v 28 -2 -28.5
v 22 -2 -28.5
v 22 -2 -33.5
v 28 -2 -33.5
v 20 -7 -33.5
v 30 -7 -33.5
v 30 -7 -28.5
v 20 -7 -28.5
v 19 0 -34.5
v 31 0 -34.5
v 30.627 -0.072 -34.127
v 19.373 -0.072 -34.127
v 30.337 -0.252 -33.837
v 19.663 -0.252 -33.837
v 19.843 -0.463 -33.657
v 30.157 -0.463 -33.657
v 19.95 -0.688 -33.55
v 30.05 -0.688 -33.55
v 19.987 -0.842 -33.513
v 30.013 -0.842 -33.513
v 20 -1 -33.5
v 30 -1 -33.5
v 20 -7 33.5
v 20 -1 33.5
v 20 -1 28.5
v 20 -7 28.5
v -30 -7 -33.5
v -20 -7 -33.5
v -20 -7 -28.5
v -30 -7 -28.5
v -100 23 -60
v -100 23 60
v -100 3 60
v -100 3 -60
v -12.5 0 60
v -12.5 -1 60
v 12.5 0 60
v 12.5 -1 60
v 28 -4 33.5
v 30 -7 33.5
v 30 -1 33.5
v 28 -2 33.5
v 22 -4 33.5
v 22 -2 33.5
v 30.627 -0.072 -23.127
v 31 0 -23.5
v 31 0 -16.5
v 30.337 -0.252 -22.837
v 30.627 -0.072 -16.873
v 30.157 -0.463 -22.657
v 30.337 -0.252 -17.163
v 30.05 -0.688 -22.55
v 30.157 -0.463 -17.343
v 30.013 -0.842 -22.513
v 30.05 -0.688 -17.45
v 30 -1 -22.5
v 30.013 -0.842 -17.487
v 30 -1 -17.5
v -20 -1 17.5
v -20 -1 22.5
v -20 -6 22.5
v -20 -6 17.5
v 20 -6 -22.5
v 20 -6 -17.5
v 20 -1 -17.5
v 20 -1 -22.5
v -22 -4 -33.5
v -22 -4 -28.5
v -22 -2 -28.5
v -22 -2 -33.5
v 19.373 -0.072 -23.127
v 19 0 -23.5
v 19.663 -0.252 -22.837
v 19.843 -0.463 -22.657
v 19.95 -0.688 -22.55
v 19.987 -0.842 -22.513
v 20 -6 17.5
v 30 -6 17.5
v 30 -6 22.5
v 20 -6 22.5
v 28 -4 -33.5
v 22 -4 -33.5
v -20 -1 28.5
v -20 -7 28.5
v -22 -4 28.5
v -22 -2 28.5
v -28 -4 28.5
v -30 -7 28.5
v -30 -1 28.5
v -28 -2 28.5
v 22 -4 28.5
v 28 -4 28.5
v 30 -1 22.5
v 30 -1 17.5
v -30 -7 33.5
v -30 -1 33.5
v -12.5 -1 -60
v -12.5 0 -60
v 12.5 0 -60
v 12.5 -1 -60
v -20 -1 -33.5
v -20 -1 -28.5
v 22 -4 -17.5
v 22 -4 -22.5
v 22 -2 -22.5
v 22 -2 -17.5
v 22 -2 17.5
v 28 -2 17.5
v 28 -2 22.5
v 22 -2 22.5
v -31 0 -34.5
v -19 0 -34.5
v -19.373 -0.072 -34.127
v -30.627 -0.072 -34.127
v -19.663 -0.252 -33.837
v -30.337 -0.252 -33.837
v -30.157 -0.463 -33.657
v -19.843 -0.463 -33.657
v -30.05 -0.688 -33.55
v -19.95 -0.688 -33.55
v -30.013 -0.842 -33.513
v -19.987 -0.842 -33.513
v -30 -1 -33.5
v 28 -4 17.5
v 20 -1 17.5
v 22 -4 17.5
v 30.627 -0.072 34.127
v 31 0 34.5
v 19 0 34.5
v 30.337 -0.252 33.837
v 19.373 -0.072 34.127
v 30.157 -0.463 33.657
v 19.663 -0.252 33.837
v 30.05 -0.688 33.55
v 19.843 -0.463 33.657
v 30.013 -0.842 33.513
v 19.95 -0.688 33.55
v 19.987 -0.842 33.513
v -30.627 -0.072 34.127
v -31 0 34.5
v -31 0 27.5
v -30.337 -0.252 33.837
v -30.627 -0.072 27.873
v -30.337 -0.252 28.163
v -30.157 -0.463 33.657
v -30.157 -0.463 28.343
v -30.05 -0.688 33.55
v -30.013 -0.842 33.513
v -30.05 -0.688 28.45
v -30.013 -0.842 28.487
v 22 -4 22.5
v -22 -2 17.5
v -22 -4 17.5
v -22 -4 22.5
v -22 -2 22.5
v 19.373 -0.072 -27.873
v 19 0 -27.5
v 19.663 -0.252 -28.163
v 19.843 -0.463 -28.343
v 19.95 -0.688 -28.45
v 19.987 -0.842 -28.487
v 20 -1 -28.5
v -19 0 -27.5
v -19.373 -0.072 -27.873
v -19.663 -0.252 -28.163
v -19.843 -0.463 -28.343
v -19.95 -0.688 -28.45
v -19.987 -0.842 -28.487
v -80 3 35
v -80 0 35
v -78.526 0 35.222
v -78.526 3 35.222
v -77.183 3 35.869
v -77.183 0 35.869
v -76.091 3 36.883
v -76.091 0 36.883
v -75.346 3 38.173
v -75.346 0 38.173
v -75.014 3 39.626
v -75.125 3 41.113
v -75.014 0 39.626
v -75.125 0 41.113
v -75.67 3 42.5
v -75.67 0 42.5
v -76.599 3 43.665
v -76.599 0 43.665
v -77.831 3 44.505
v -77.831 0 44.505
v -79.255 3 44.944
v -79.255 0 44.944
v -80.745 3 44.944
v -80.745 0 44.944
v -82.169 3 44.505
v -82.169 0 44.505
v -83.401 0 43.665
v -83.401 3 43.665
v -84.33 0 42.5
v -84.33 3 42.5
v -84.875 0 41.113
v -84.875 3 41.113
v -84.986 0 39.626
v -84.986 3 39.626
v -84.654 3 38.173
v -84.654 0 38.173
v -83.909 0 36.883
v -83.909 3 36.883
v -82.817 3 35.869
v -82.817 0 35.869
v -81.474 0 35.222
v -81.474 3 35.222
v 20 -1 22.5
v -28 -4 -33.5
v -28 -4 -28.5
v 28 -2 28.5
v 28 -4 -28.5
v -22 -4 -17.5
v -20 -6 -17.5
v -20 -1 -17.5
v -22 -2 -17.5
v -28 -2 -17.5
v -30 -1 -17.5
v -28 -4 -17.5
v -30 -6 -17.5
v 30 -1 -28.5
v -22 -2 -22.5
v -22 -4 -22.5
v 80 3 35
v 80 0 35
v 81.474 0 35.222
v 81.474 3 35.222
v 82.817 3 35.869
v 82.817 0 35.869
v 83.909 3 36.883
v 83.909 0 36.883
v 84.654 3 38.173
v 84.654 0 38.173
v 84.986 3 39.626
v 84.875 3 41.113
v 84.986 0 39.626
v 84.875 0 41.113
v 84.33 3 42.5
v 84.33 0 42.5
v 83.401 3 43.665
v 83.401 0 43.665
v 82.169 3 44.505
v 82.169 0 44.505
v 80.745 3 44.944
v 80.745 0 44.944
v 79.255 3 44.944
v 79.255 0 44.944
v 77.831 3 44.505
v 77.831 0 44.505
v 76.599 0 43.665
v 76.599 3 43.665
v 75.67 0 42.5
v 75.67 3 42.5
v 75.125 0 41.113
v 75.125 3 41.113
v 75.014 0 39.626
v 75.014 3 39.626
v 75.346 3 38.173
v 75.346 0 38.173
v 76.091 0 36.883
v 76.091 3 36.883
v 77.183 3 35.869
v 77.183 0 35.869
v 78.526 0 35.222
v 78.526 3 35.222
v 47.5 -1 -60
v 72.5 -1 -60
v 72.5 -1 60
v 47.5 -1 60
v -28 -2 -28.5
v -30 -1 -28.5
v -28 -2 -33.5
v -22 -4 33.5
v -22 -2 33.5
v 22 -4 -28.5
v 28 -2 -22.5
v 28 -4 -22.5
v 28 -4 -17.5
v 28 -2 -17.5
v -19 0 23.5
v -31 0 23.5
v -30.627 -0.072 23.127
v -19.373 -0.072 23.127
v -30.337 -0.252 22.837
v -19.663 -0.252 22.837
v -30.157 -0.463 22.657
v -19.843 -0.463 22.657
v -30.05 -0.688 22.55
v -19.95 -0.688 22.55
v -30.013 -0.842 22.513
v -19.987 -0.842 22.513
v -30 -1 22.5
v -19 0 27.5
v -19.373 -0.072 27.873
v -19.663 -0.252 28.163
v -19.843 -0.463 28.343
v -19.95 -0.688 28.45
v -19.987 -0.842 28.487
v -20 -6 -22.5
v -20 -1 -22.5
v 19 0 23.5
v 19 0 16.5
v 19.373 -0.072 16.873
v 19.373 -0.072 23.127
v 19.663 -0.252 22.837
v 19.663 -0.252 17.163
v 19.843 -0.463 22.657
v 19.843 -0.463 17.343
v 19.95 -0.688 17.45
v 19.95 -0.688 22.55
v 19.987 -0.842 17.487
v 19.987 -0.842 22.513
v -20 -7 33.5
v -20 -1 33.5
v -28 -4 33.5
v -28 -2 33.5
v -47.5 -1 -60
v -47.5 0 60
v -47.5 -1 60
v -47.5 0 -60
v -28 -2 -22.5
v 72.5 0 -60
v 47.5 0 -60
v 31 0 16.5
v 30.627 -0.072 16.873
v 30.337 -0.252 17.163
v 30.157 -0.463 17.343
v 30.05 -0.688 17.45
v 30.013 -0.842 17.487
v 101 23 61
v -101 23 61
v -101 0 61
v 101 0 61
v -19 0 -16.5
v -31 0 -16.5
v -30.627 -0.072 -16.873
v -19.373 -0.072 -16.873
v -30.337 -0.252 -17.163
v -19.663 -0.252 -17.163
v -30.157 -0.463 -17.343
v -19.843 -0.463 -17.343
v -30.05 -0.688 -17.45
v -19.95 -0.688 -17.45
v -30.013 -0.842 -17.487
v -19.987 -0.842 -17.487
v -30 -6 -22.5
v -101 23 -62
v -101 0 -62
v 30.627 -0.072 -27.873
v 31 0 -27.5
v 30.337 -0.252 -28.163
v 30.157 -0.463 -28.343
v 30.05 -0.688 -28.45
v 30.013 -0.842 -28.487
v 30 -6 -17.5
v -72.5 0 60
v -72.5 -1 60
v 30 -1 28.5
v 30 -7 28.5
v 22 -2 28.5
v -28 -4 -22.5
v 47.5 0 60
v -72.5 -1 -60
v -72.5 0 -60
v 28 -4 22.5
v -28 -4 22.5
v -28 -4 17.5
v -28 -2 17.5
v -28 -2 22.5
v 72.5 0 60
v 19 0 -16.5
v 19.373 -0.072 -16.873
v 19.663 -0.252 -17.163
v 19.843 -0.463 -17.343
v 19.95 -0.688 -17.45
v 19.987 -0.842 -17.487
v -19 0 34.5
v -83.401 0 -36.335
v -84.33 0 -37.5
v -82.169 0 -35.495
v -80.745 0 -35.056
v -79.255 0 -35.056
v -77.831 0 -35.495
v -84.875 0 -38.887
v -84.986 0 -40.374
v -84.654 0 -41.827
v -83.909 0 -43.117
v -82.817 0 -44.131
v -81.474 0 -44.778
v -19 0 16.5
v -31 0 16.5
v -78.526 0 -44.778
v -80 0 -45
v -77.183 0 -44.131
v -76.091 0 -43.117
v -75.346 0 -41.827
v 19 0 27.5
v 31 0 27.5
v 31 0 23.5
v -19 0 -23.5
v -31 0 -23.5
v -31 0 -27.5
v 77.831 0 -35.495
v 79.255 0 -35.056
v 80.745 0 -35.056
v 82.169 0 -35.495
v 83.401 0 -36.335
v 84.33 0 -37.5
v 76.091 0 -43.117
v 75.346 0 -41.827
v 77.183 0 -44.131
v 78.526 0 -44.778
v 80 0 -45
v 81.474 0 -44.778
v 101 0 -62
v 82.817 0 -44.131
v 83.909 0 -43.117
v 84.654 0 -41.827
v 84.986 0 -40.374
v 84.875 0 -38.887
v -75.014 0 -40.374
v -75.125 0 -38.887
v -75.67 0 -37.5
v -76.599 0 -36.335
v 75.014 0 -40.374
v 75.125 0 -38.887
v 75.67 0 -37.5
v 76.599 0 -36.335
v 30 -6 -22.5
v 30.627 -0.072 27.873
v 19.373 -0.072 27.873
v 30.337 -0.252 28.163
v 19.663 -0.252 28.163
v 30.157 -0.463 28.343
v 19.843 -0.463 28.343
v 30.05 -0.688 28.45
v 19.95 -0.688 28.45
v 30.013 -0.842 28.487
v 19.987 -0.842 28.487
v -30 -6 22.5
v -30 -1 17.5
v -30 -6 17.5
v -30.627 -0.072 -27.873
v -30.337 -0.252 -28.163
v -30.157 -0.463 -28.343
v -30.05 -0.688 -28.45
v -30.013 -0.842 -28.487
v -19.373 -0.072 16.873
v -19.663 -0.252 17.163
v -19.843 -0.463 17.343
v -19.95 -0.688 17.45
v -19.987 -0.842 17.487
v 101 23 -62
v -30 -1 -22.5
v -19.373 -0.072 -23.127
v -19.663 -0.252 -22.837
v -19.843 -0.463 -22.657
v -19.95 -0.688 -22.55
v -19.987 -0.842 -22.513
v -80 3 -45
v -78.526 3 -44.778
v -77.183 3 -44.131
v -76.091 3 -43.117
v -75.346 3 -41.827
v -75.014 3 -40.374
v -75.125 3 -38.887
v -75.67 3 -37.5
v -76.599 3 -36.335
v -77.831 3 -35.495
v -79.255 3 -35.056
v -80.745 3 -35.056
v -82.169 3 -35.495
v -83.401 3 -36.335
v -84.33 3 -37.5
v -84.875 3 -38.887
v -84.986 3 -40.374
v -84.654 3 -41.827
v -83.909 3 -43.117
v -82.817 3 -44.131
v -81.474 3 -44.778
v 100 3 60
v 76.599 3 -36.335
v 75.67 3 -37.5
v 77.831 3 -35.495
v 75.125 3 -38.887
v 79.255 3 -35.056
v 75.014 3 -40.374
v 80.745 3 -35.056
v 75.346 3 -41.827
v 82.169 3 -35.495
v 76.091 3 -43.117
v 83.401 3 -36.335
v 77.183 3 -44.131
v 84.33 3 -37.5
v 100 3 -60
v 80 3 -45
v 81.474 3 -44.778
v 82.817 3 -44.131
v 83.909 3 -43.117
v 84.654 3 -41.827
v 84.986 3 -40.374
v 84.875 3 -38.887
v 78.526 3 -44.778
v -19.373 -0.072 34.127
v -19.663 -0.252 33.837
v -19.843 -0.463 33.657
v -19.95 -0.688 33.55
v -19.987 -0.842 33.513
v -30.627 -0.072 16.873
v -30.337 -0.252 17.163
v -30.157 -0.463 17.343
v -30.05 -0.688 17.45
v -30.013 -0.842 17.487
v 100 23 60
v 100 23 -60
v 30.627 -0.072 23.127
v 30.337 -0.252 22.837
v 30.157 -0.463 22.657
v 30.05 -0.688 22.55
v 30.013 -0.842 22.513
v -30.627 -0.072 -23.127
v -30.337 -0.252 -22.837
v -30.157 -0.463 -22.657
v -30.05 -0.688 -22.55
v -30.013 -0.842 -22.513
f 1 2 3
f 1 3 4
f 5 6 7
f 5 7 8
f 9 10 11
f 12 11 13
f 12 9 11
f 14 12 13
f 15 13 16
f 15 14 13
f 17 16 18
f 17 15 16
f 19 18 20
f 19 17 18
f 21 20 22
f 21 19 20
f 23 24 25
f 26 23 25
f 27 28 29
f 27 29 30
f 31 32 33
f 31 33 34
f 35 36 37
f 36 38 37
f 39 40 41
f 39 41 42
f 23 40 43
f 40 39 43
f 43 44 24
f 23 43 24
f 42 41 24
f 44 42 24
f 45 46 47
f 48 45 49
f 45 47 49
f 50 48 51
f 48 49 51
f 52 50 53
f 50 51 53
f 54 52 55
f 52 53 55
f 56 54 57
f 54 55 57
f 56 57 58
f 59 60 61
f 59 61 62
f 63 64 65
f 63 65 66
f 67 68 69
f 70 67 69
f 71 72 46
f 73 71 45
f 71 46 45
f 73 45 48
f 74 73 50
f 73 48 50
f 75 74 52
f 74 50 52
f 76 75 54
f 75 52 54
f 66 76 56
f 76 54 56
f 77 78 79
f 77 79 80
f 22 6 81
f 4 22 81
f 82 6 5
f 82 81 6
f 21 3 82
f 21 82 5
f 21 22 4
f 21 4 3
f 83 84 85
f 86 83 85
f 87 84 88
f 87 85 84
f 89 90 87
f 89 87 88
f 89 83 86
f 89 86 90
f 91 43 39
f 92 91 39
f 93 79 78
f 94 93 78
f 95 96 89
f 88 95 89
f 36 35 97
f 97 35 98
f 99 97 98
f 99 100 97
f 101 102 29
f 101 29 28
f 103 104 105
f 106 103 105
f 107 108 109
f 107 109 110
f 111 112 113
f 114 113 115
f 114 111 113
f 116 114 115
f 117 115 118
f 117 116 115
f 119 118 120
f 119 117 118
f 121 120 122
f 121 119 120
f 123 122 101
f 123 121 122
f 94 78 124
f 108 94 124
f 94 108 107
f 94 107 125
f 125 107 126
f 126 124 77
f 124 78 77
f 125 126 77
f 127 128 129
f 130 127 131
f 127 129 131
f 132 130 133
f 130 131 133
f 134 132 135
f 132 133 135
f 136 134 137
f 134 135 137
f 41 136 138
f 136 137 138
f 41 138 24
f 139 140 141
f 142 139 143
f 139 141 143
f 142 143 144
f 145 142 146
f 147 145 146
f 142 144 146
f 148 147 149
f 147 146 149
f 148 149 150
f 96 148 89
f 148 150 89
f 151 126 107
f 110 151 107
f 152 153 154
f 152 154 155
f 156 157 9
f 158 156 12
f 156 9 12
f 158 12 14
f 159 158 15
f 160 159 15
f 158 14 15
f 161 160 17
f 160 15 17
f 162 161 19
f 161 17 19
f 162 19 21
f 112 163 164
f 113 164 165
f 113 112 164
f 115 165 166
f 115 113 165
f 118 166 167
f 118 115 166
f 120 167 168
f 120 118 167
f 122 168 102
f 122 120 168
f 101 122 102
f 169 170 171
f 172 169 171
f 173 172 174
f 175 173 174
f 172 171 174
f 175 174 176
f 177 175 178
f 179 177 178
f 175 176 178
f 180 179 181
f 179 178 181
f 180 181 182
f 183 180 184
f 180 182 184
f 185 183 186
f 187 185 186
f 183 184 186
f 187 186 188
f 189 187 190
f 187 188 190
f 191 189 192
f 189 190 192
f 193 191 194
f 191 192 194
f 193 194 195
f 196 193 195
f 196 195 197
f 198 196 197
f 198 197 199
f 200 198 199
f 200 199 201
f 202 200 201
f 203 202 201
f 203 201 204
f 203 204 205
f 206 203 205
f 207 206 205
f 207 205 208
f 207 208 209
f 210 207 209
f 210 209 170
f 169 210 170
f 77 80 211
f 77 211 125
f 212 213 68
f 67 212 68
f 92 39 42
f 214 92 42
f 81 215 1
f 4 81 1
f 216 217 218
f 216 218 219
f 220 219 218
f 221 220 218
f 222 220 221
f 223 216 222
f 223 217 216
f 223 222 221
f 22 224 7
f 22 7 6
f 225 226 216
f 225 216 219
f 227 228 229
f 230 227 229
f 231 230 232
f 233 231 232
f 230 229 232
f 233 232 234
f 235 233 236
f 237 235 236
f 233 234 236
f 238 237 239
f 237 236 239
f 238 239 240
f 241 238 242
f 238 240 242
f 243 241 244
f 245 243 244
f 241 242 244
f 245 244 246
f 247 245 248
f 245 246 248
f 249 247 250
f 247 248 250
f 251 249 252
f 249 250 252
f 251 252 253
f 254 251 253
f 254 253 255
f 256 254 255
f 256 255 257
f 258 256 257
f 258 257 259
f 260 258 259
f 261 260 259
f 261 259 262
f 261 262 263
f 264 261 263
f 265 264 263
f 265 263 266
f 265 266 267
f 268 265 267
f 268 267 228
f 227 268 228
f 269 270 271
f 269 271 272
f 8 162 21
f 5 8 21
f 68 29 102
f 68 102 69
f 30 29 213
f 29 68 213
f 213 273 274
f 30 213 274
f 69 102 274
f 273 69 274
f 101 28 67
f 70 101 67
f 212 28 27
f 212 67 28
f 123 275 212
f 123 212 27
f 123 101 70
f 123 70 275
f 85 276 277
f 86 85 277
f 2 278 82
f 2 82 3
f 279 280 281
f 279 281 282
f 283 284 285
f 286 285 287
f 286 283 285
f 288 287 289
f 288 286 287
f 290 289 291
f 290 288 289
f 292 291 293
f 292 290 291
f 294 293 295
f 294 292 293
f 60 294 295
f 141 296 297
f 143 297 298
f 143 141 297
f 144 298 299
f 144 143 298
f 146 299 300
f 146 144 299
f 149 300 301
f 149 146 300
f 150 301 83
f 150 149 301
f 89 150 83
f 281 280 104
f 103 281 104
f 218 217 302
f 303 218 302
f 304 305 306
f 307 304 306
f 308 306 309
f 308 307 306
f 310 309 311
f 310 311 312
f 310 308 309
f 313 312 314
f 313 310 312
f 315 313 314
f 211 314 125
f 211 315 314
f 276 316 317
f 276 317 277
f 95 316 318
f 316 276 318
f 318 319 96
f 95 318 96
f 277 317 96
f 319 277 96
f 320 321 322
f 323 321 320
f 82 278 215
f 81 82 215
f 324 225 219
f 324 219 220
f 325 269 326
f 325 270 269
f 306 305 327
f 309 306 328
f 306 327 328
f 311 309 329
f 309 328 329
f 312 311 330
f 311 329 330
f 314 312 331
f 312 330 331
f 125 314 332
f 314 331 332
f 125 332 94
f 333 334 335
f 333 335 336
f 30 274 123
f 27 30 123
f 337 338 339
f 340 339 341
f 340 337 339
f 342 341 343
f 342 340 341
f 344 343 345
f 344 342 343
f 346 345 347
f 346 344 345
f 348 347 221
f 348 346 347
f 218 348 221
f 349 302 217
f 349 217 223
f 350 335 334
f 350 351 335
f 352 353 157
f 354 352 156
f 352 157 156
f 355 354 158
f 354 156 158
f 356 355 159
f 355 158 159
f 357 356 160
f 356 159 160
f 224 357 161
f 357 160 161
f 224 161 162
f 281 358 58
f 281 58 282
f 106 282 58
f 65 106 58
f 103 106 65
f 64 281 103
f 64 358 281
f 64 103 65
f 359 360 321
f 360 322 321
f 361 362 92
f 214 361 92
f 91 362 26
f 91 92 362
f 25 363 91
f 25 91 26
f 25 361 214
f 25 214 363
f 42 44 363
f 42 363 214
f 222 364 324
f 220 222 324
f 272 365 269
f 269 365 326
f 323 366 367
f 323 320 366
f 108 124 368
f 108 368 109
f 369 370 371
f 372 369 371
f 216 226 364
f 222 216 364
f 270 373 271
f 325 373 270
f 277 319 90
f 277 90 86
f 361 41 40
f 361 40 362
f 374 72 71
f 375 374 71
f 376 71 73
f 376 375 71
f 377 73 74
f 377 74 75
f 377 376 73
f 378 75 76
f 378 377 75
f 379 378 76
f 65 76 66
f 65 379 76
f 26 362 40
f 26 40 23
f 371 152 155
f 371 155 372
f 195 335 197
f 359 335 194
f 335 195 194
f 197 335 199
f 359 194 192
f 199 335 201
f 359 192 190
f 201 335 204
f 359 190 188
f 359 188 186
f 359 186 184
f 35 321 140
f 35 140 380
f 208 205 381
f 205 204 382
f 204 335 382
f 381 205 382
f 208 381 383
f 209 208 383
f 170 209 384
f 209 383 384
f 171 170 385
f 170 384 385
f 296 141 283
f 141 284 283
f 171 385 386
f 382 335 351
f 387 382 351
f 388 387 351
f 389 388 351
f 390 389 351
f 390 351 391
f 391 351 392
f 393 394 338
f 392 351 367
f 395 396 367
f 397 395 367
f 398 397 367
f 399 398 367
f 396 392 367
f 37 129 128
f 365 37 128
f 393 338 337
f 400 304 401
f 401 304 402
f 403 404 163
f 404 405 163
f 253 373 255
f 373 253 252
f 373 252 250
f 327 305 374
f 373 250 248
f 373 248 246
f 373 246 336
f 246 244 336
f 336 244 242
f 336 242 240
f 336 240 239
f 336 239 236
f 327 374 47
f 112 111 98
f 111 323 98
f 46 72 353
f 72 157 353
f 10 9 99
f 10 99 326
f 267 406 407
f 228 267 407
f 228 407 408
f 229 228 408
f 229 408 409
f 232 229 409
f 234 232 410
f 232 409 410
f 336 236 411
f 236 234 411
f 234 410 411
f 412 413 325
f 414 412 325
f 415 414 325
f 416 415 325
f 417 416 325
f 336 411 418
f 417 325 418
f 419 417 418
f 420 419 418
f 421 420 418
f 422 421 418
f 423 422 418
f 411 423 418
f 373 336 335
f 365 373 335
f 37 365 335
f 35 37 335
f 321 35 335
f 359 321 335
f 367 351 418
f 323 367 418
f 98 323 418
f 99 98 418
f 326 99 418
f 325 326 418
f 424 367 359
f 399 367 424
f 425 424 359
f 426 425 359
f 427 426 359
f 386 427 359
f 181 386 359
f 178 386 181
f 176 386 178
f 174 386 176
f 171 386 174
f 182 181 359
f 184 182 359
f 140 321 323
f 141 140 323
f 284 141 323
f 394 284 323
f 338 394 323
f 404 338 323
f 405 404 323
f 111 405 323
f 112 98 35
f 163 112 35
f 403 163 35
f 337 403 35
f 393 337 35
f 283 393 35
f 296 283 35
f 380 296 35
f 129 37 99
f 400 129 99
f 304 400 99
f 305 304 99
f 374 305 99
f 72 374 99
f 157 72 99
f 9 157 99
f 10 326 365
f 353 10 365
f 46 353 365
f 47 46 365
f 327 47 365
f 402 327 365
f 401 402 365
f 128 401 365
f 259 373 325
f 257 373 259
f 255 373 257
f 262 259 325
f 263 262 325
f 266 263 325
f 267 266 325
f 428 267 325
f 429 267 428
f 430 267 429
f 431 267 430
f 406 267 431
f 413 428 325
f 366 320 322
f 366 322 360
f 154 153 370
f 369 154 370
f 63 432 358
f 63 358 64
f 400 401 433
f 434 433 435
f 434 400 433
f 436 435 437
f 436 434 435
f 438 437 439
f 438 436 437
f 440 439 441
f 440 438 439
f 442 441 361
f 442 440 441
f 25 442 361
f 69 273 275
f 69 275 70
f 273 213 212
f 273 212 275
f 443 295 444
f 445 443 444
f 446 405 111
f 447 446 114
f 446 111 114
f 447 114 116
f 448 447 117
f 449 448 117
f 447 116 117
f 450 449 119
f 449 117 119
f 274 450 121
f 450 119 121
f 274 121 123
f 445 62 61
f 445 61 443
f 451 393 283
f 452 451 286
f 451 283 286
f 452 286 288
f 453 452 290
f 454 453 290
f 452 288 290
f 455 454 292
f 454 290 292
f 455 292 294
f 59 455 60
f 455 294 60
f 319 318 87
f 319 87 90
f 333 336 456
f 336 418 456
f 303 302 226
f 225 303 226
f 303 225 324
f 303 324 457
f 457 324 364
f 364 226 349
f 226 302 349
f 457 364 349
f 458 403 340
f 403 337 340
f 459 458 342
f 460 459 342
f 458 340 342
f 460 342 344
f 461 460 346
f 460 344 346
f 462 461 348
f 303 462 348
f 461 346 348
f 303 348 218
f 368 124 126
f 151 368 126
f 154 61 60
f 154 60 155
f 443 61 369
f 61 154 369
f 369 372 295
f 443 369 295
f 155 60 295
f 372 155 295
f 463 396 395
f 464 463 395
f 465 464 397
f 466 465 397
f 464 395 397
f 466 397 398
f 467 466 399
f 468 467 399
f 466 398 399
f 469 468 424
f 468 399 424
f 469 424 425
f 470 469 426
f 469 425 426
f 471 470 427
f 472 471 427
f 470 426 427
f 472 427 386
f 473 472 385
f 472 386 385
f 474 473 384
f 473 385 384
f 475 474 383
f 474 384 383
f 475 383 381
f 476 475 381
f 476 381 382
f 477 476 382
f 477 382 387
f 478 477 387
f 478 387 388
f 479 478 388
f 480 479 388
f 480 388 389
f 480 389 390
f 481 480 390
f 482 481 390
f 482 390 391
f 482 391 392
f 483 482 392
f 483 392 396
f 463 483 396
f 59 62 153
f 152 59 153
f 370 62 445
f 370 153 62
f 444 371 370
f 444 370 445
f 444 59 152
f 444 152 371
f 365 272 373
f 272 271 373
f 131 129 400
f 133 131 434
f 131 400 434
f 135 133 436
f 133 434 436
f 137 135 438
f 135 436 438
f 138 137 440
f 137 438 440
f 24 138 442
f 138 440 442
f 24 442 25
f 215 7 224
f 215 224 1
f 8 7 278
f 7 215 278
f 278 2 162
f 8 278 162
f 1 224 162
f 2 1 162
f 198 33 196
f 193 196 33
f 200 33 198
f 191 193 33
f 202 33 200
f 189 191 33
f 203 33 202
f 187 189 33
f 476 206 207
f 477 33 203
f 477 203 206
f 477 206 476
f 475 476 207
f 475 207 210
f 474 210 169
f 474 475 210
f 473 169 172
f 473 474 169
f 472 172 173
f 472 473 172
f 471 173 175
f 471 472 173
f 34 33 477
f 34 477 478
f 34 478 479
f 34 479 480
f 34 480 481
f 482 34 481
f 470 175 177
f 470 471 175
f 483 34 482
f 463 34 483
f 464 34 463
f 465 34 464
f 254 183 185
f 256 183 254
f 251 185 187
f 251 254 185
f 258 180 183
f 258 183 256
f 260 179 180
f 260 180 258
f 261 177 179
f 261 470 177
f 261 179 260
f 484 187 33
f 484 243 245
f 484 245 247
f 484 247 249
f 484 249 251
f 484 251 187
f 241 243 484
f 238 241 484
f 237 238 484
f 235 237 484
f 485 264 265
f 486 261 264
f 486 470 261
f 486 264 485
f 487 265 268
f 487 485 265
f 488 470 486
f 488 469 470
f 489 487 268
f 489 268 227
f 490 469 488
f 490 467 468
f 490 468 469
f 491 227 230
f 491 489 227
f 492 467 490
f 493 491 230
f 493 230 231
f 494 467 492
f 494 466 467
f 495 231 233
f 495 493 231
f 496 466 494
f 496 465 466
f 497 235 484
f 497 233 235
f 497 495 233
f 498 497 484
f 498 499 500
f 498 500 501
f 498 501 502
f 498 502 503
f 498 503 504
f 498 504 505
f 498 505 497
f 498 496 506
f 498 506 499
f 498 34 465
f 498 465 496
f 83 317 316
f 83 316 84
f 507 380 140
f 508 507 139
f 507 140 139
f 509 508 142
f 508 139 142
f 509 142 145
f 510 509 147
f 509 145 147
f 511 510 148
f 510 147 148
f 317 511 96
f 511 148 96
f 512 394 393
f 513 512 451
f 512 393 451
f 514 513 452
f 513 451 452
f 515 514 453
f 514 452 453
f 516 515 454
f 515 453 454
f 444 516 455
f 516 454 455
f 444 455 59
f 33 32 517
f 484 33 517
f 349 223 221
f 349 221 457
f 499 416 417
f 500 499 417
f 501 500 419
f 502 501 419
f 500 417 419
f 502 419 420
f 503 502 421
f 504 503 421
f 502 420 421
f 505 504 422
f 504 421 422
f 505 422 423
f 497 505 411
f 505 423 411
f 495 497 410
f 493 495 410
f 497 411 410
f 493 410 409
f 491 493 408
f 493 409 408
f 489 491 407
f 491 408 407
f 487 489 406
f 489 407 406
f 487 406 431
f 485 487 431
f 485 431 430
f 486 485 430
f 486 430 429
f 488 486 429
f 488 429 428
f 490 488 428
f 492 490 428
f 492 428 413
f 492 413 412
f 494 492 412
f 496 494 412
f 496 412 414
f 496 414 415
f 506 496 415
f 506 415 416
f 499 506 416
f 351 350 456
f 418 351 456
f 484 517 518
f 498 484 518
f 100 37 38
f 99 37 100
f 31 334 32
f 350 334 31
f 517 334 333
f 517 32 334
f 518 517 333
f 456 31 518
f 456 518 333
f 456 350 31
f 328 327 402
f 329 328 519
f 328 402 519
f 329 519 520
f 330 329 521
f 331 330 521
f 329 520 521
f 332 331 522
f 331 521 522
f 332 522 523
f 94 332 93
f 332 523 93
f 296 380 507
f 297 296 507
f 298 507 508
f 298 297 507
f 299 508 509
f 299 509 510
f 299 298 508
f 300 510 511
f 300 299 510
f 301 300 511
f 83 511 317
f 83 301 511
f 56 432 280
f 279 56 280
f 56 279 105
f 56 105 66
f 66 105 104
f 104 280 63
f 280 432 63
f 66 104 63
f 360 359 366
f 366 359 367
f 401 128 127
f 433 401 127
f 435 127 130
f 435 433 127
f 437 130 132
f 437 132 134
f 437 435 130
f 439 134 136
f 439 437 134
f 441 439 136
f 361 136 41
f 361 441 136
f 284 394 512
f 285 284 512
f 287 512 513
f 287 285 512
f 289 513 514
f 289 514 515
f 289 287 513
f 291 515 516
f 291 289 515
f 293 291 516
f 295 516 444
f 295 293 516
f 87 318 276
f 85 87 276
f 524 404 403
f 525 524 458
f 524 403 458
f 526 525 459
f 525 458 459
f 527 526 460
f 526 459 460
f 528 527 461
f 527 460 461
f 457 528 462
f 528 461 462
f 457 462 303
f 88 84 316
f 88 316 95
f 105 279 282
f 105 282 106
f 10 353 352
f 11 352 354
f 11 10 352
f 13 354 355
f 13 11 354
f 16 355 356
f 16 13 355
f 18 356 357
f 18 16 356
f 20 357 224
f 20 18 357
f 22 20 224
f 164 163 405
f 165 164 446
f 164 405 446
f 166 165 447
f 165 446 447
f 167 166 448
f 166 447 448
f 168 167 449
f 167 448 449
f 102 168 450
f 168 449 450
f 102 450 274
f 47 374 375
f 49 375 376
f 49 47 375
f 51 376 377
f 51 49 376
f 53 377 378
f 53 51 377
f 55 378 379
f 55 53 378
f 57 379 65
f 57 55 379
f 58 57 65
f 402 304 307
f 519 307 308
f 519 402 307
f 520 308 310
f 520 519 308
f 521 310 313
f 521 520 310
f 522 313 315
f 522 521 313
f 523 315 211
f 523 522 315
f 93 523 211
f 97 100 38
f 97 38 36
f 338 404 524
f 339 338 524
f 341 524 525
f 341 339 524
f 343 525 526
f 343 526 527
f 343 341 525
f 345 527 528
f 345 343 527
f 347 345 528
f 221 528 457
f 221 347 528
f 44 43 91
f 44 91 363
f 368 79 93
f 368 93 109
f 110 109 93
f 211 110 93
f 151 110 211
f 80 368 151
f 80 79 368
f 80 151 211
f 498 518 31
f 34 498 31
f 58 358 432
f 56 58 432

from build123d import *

# Parameters (mm, degrees)
SKETCH1_W             = 200
SKETCH1_H             = 120
BOSS_EXTRUDE3_DEPTH   = 3
SKETCH7_W             = 25
SKETCH7_H             = 120
BOSS_EXTRUDE4_DEPTH   = 1
SKETCH8_W             = 10
SKETCH8_H             = 5
BOSS_EXTRUDE5_DEPTH   = 2
BOSS_EXTRUDE5_2_DEPTH = 2
BOSS_EXTRUDE5_3_DEPTH = 2
BOSS_EXTRUDE5_4_DEPTH = 2
SKETCH10_W            = 10
SKETCH10_H            = 5
BOSS_EXTRUDE6_DEPTH   = 5
SKETCH11_R            = 5
CUT_EXTRUDE4_DEPTH    = 5
SKETCH13_W            = 6
SKETCH13_H            = 2
CUT_EXTRUDE5_DEPTH    = 130.77769454
FILLET3_R             = 1
FILLET4_R             = 1
SKETCH15_W            = 10
SKETCH15_H            = 5
BOSS_EXTRUDE9_DEPTH   = 7
SKETCH16_W            = 6
SKETCH16_H            = 2
CUT_EXTRUDE8_DEPTH    = 138.081180328
FILLET5_R             = 1
SKETCH18_W            = 120
SKETCH18_H            = 23
BOSS_EXTRUDE10_DEPTH  = 1
SKETCH19_W            = 202
SKETCH19_H            = 23
BOSS_EXTRUDE11_DEPTH  = 1
MIRROR2_START         = -62
MIRROR2_OUTLINE_W     = 202
MIRROR2_OUTLINE_H     = 23
MIRROR2_DEPTH         = 1
MIRROR2_START_2       = 60
MIRROR2_2_OUTLINE_W   = 202
MIRROR2_2_OUTLINE_H   = 23
MIRROR2_2_DEPTH       = 1


# Read off the part's stored shape, not the designer's step: Mirror2
with BuildPart() as part:
    # Sketch1 → Boss-Extrude3 (new body)
    with BuildSketch(Plane(origin=(0, 0, 0), x_dir=(1, 0, 0), z_dir=(0, 1, 0))):
        Rectangle(SKETCH1_W, SKETCH1_H)
    extrude(amount=BOSS_EXTRUDE3_DEPTH)

    # Sketch7 → Boss-Extrude4 (add)
    with BuildSketch(Plane(origin=(0, 0, 0), x_dir=(-1, 0, 0), z_dir=(0, -1, 0))):
        Rectangle(SKETCH7_W, SKETCH7_H)
        with Locations((60, 0)):
            Rectangle(SKETCH7_W, SKETCH7_H)
        with Locations((-60, 0)):
            Rectangle(SKETCH7_W, SKETCH7_H)
    extrude(amount=BOSS_EXTRUDE4_DEPTH)



with BuildPart() as body_2:
    # Sketch8 → Boss-Extrude5 (new body)
    with BuildSketch(Plane(origin=(0, -1, 0), x_dir=(-1, 0, 0), z_dir=(0, -1, 0))):
        with Locations((25, -20)):
            Rectangle(SKETCH8_W, SKETCH8_H)
    extrude(amount=-BOSS_EXTRUDE5_DEPTH)


with BuildPart() as body_3:
    # Sketch8 → Boss-Extrude5 2 (new body)
    with BuildSketch(Plane(origin=(0, -1, 0), x_dir=(-1, 0, 0), z_dir=(0, -1, 0))):
        with Locations((-25, -20)):
            Rectangle(SKETCH8_W, SKETCH8_H)
    extrude(amount=-BOSS_EXTRUDE5_2_DEPTH)


with BuildPart() as body_4:
    # Sketch8 → Boss-Extrude5 3 (new body)
    with BuildSketch(Plane(origin=(0, -1, 0), x_dir=(-1, 0, 0), z_dir=(0, -1, 0))):
        with Locations((-25, 20)):
            Rectangle(SKETCH8_W, SKETCH8_H)
    extrude(amount=-BOSS_EXTRUDE5_3_DEPTH)


with BuildPart() as body_5:
    # Sketch8 → Boss-Extrude5 4 (new body)
    with BuildSketch(Plane(origin=(0, -1, 0), x_dir=(-1, 0, 0), z_dir=(0, -1, 0))):
        with Locations((25, 20)):
            Rectangle(SKETCH8_W, SKETCH8_H)
    extrude(amount=-BOSS_EXTRUDE5_4_DEPTH)


with BuildPart() as part_1:
    add(part.part)

    add(body_2.part)  # Boss-Extrude6 merges body 2

    add(body_3.part)  # Boss-Extrude6 merges body 3

    add(body_4.part)  # Boss-Extrude6 merges body 4

    add(body_5.part)  # Boss-Extrude6 merges body 5
    # Sketch10 → Boss-Extrude6 (add)
    with BuildSketch(Plane(origin=(0, -1, 0), x_dir=(-1, 0, 0), z_dir=(0, -1, 0))):
        with Locations((25, -20)):
            Rectangle(SKETCH10_W, SKETCH10_H)
        with Locations((25, 20)):
            Rectangle(SKETCH10_W, SKETCH10_H)
        with Locations((-25, 20)):
            Rectangle(SKETCH10_W, SKETCH10_H)
        with Locations((-25, -20)):
            Rectangle(SKETCH10_W, SKETCH10_H)
    extrude(amount=BOSS_EXTRUDE6_DEPTH)

    # Sketch11 → Cut-Extrude4 (cut)
    with BuildSketch(Plane(origin=(0, 0, 0), x_dir=(-1, 0, 0), z_dir=(0, -1, 0))):
        with Locations(Location((-80, -40, 0), (0, 0, 90))):
            Circle(SKETCH11_R)
        with Locations(Location((-80, 40, 0), (0, 0, 90))):
            Circle(SKETCH11_R)
        with Locations(Location((80, 40, 0), (0, 0, 90))):
            Circle(SKETCH11_R)
        with Locations(Location((80, -40, 0), (0, 0, 90))):
            Circle(SKETCH11_R)
    extrude(amount=-CUT_EXTRUDE4_DEPTH, mode=Mode.SUBTRACT)

    # Sketch13 → Cut-Extrude5 (cut, through all)
    with BuildSketch(Plane(origin=(0, 0, -22.5), x_dir=(-1, 0, 0), z_dir=(0, 0, -1))):
        with Locations((25, -3)):
            Rectangle(SKETCH13_W, SKETCH13_H)
        with Locations((-25, -3)):
            Rectangle(SKETCH13_W, SKETCH13_H)
    extrude(amount=-CUT_EXTRUDE5_DEPTH, mode=Mode.SUBTRACT)

    # Fillet3
    fillet3_edges = [part_1.edges().sort_by_distance(p)[0] for p in [
        (30, 0, -20),
        (25, 0, -17.5),
        (20, 0, -20),
        (25, 0, -22.5),
    ]]
    fillet(fillet3_edges, radius=FILLET3_R)

    # Fillet4
    fillet4_edges = [part_1.edges().sort_by_distance(p)[0] for p in [
        (-25, 0, -22.5),
        (-20, 0, -20),
        (-25, 0, -17.5),
        (-30, 0, -20),
        (-25, 0, 22.5),
        (-30, 0, 20),
        (-25, 0, 17.5),
        (-20, 0, 20),
        (25, 0, 22.5),
        (20, 0, 20),
        (25, 0, 17.5),
        (30, 0, 20),
    ]]
    fillet(fillet4_edges, radius=FILLET4_R)

    # Sketch15 → Boss-Extrude9 (add)
    with BuildSketch(Plane(origin=(0, 0, 0), x_dir=(-1, 0, 0), z_dir=(0, -1, 0))):
        with Locations((-25, 31)):
            Rectangle(SKETCH15_W, SKETCH15_H)
        with Locations((25, 31)):
            Rectangle(SKETCH15_W, SKETCH15_H)
        with Locations((25, -31)):
            Rectangle(SKETCH15_W, SKETCH15_H)
        with Locations((-25, -31)):
            Rectangle(SKETCH15_W, SKETCH15_H)
    extrude(amount=BOSS_EXTRUDE9_DEPTH)

    # Sketch16 → Cut-Extrude8 (cut, through all)
    with BuildSketch(Plane.XY.offset(33.5)):
        with Locations((25, -3)):
            Rectangle(SKETCH16_W, SKETCH16_H)
        with Locations((-25, -3)):
            Rectangle(SKETCH16_W, SKETCH16_H)
    extrude(amount=-CUT_EXTRUDE8_DEPTH, mode=Mode.SUBTRACT)

    # Fillet5
    fillet5_edges = [part_1.edges().sort_by_distance(p)[0] for p in [
        (30, 0, -31),
        (25, 0, -28.5),
        (20, 0, -31),
        (25, 0, -33.5),
        (-20, 0, -31),
        (-25, 0, -28.5),
        (-30, 0, -31),
        (-25, 0, -33.5),
        (-25, 0, 28.5),
        (-20, 0, 31),
        (-25, 0, 33.5),
        (-30, 0, 31),
        (20, 0, 31),
        (25, 0, 28.5),
        (30, 0, 31),
        (25, 0, 33.5),
    ]]
    fillet(fillet5_edges, radius=FILLET5_R)

    # Sketch18 → Boss-Extrude10 (add)
    with BuildSketch(Plane(origin=(100, 0, 0), x_dir=(0, 0, -1), z_dir=(1, 0, 0))):
        with Locations((0, 11.5)):
            Rectangle(SKETCH18_W, SKETCH18_H)
    boss_extrude10 = extrude(amount=BOSS_EXTRUDE10_DEPTH)

    # Mirror1: Boss-Extrude10 across plane
    add(boss_extrude10.mirror(Plane(origin=(0, 0, 0), x_dir=(0, 0, 1), z_dir=(1, 0, 0))))

    # Sketch19 → Boss-Extrude11 (add)
    with BuildSketch(Plane(origin=(0, 0, -60), x_dir=(-1, 0, 0), z_dir=(0, 0, -1))):
        with Locations((0, 11.5)):
            Rectangle(SKETCH19_W, SKETCH19_H)
    extrude(amount=BOSS_EXTRUDE11_DEPTH)

    # Mirror2 outline → Mirror2 (add)
    with BuildSketch(Plane.XY.offset(MIRROR2_START)):
        with Locations((0, 11.5)):
            Rectangle(MIRROR2_OUTLINE_W, MIRROR2_OUTLINE_H)
    extrude(amount=MIRROR2_DEPTH)

    # Mirror2 2 outline → Mirror2 2 (add)
    with BuildSketch(Plane.XY.offset(MIRROR2_START_2)):
        with Locations((0, 11.5)):
            Rectangle(MIRROR2_2_OUTLINE_W, MIRROR2_2_OUTLINE_H)
    extrude(amount=MIRROR2_2_DEPTH)


solid = part_1.part
